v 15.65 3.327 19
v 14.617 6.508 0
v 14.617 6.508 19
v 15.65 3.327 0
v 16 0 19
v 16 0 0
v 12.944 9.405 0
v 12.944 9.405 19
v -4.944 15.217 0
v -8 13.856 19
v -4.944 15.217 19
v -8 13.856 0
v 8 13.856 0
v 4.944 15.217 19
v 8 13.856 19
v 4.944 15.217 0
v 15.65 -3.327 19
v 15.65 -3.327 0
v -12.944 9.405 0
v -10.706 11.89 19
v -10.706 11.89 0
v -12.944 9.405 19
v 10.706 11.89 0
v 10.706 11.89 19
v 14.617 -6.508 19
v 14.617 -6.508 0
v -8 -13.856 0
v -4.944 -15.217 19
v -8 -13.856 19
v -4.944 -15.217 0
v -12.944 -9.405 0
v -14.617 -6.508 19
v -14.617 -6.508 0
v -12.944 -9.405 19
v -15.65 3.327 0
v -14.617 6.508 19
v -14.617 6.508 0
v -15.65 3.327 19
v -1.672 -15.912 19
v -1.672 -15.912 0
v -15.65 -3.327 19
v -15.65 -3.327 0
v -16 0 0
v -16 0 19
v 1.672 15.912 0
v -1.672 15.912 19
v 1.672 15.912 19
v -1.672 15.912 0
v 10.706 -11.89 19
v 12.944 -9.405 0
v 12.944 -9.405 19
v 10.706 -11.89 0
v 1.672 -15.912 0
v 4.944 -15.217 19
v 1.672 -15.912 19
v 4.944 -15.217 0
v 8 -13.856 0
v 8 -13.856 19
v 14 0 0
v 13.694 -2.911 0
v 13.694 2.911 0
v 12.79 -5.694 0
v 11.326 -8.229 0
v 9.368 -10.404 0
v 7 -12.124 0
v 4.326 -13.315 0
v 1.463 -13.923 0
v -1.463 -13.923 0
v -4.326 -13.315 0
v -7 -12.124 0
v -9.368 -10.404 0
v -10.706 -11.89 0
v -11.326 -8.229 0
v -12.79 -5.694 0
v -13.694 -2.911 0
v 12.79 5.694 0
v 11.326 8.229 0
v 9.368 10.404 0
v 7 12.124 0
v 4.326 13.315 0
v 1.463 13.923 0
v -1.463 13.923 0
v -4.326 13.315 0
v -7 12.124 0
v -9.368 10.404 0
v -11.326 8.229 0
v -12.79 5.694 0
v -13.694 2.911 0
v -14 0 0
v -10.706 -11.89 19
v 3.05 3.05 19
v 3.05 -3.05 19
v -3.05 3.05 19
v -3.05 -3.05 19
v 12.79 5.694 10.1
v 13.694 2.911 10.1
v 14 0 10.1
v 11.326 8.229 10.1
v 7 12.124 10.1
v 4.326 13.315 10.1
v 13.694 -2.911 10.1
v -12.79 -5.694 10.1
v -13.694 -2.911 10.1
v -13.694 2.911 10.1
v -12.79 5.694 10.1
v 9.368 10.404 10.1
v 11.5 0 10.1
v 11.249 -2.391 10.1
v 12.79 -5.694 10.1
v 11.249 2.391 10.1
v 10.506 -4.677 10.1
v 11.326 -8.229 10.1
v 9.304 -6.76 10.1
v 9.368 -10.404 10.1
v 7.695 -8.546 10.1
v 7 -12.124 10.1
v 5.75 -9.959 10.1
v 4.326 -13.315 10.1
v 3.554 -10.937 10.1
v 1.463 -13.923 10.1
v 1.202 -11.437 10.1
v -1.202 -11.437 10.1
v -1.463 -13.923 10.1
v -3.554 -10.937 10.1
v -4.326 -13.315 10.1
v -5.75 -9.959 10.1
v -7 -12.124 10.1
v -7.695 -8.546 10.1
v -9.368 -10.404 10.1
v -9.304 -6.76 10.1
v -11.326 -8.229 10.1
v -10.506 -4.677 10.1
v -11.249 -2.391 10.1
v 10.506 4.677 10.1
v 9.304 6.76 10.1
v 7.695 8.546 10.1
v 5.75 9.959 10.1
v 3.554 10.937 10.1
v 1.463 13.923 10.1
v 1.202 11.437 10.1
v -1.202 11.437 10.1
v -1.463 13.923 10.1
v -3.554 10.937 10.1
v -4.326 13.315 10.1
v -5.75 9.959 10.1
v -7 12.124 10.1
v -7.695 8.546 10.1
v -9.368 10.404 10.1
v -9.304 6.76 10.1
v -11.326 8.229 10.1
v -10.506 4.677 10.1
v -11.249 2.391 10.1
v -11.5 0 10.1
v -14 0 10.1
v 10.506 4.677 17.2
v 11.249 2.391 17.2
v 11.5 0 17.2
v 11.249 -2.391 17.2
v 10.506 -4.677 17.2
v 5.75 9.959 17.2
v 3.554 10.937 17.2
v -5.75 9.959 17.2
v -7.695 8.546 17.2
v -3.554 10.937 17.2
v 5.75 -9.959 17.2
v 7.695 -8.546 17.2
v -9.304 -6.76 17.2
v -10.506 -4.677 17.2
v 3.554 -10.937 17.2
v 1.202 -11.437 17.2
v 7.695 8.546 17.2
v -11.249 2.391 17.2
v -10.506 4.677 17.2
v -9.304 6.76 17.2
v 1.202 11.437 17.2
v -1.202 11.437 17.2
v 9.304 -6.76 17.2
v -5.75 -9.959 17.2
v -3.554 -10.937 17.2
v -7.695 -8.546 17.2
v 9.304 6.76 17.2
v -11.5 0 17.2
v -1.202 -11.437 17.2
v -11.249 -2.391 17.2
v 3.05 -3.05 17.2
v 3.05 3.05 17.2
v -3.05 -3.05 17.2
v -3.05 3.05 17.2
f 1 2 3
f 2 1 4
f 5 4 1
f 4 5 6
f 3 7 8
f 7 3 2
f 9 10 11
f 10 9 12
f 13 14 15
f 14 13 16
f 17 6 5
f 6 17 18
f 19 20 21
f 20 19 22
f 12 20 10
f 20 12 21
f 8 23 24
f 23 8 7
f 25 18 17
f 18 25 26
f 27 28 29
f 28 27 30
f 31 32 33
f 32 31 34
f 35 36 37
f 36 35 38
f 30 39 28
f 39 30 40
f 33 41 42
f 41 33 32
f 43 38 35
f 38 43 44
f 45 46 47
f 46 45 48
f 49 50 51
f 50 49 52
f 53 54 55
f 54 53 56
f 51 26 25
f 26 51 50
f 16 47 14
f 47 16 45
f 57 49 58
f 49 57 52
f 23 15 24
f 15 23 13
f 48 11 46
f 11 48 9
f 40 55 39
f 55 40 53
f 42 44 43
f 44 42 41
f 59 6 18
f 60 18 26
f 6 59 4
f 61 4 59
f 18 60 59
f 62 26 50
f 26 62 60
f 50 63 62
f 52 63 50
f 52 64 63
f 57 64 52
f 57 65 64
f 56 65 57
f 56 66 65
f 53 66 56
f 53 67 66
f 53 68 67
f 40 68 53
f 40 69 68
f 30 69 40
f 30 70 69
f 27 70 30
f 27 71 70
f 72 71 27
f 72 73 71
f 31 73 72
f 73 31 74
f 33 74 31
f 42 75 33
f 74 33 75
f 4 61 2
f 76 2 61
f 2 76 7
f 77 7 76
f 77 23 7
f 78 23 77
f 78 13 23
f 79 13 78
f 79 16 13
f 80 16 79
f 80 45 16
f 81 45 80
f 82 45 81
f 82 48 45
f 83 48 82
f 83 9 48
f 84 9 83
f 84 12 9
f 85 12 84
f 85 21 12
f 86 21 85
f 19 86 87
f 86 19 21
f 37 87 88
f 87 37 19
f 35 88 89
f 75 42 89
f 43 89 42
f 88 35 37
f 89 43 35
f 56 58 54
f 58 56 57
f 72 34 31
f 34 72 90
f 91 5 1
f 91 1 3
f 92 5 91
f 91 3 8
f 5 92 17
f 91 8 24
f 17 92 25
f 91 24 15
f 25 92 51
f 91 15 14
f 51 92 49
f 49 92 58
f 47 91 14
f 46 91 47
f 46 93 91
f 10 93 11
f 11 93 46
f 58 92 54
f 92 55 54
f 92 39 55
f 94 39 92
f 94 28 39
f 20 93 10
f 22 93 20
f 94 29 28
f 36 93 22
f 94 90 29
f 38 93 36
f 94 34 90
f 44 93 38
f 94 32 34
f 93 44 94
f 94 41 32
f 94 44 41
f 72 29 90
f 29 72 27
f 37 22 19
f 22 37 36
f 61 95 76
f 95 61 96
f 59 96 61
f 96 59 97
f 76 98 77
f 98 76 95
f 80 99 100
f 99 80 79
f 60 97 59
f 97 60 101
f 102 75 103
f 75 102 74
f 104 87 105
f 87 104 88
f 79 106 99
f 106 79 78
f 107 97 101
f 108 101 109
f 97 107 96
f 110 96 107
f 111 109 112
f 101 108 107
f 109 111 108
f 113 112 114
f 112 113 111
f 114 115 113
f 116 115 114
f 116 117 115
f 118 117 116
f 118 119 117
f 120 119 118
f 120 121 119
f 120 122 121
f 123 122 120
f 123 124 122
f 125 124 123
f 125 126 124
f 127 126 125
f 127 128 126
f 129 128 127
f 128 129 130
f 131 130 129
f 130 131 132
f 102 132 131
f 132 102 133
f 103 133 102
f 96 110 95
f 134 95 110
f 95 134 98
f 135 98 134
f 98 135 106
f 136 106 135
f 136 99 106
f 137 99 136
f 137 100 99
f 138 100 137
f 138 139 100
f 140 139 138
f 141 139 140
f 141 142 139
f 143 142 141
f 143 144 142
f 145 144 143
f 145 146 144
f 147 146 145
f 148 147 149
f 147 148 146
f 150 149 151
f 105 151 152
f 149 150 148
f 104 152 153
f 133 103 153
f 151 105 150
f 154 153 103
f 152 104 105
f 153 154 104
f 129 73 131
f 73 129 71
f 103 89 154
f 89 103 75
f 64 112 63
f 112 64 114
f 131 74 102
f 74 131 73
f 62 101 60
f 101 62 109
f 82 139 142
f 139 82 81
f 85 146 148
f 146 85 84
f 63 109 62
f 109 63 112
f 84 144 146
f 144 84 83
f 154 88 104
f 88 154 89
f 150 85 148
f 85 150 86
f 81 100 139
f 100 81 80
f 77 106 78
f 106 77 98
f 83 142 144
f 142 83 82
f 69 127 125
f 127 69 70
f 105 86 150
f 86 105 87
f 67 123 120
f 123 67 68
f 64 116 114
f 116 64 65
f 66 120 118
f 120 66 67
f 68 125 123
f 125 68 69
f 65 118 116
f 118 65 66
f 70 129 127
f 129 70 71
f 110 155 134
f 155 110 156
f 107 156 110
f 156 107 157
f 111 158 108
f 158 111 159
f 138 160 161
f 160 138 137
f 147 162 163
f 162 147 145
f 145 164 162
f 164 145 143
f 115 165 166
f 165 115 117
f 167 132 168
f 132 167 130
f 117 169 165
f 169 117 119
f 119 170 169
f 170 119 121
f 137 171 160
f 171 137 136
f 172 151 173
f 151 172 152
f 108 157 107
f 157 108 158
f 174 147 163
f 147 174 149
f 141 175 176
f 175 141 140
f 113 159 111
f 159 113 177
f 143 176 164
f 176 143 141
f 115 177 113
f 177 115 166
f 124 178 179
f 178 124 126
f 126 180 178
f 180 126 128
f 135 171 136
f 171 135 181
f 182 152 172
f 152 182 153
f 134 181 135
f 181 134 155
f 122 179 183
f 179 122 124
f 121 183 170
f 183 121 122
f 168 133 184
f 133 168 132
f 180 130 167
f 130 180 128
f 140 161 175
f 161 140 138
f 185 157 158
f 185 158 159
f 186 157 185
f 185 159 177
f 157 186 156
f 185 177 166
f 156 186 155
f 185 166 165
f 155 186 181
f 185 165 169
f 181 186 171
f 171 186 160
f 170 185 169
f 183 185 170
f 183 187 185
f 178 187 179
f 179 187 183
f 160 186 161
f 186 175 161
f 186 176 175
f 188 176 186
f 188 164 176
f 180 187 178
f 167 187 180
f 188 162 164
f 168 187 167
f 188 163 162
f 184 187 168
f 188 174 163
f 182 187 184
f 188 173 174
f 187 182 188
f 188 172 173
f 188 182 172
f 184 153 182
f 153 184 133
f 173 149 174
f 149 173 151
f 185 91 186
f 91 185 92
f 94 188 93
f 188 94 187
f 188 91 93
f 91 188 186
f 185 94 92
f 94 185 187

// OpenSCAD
// file: settingsLenghts.scad
//Ancho de la pared
pared  = 2;
//Radio del centro hueco
radioC = 11;
//Alto de la capa de apertura
aperH = 5.5;
//Ancho de la apertura
aperW = 5+1.1;//Ancho mas holgura
//Ancho del lente macro
macroW = 9.3;
//Profundidad del macro
macroH = 3;
//Profundidad parte de atras y delante
profDelante = 6;
profAtras = 6;
//Ceja entre uniones de cilindros
cejaH = 6;
guiaParedW = 2;
tmpHolg = 1.8;


//Correcc

//
//CÁMARA
camP = 3;//Grueso de la pared del presente modelo
camW = 105;//Ancho de la cámara
camH = 61;//Alto de la cámara
camD = 23.5;//Profundidad de la cámara
camHlg = 6;//Holgura que se deja para los tornillos
camLW = 57/2;//Radio del exterior del lente
torW  = 2;//Radio

//
//Ancho de tubo principal (grande)
mcW = 32;//radio
mcH = 28;

//Dimensiones del difractador
diffW = 51;//Alto y Ancho
diffD=1;//Profundidad del difractador
diffWinW=36;//Ancho de la ventana de difracción
diffWinH=24;//Alto de la ventana de difracción

//
//Adquisición de luz
luzHBig = 10; //donde va el tornillo
luzWBig = 28; //27:diametro donde va el tornillo
luzHBigT = 4; //alto del tornillo
luzWBigT = 6; //6: ancho del tornillo
luzHRosca = 7; //donde va la rosca
luzWRosca = 23; //22:diametro de donde va la rosca



//Cuadro guia para que no se mueva
guiaH = cejaH;
guiaW = 3;



module creaPared(h){
	difference(){
		//Pone el cilindro principal
		cylinder(r=mcW,h);

		//Le quita el contorno exterior
		translate([0,0,-0.1])
		cylinder(r=mcW-pared,h+0.2);
	}
}
module creaGuiaTornilloCentrada(){
	translate([-luzWBigT/2,-luzWBigT/2,0])
	cube([luzWBigT,luzWBigT,luzHBig-1+0.2]);
}
module creaGuiaTornilloCentradaArea(){
	tmpW = luzWBigT + pared;
	tmpH = luzHBig  + pared;
	translate([-tmpW/2,-tmpW/2,0])
	cube([tmpW,tmpW,tmpH]);
}
module creaGuia(h){
	//Pone el circulo soporte
	difference(){
		cylinder(r=mcW,h);
		translate([0,0,-0.1])
		cylinder(r=mcW-pared,h+0.2);
	}
	//Pone la guia1
	translate([0,mcW-pared-(guiaW/2)+0.4,0])
	creaGuiaCentrada(h);
}
module creaGuiaHembra(h){
	//Pone el circulo soporte
	tmpW = mcW-guiaW;	
	creaPared(sopH);
	sopH = 1.35;
	
	//Pone la pared de la guia
	difference(){
		cylinder(r=(mcW-pared),sopH+h);
		translate([0,0,-0.1])
		cylinder(r=(mcW-pared-guiaParedW),sopH+h+0.2);
		//Pone la guia
		translate([-(guiaW/3),tmpW,sopH])
		creaGuiaCentrada(sopH+h+0.2);
		translate([(guiaW/3),tmpW,sopH])
		creaGuiaCentrada(sopH+h+0.2);
	}
}
module creaGuiaCentrada(h){
	translate([-guiaW/2,-guiaW/2,0])
	cube([guiaW,guiaW,h]);
}
// main file
include <settingsLenghts.scad>


/////////////////////////////////////

crearBaseAdqLuz();

module crearAreaLuz(){
	cylinder(r=(luzWBig/2)+pared,luzHBig+luzHRosca+pared);
}

module crearBaseAdqLuz(){
	difference(){
		//Toda el área de trabajo
		crearAreaLuz();

		//Cilindro para que entre lente 
		//adquicisión de luz
		translate([0, 0, -0.1])
		cylinder(r=luzWBig/2,luzHBig+0.2);

	
		//Espacio para que entre la rosca
		translate([0, 0, luzHBig])
		cylinder(r=luzWRosca/2,luzHRosca+0.2);

		//Área donde sienta el lente y sirve para
		//bloquear la luz de las paredes
		translate([0, 0, luzHBig+luzHRosca])
		//Le quita la apertura
		translate([-aperW/2,-aperW/2,-0.1])
		cube([aperW,aperW,pared+0.2]);
	}
}
